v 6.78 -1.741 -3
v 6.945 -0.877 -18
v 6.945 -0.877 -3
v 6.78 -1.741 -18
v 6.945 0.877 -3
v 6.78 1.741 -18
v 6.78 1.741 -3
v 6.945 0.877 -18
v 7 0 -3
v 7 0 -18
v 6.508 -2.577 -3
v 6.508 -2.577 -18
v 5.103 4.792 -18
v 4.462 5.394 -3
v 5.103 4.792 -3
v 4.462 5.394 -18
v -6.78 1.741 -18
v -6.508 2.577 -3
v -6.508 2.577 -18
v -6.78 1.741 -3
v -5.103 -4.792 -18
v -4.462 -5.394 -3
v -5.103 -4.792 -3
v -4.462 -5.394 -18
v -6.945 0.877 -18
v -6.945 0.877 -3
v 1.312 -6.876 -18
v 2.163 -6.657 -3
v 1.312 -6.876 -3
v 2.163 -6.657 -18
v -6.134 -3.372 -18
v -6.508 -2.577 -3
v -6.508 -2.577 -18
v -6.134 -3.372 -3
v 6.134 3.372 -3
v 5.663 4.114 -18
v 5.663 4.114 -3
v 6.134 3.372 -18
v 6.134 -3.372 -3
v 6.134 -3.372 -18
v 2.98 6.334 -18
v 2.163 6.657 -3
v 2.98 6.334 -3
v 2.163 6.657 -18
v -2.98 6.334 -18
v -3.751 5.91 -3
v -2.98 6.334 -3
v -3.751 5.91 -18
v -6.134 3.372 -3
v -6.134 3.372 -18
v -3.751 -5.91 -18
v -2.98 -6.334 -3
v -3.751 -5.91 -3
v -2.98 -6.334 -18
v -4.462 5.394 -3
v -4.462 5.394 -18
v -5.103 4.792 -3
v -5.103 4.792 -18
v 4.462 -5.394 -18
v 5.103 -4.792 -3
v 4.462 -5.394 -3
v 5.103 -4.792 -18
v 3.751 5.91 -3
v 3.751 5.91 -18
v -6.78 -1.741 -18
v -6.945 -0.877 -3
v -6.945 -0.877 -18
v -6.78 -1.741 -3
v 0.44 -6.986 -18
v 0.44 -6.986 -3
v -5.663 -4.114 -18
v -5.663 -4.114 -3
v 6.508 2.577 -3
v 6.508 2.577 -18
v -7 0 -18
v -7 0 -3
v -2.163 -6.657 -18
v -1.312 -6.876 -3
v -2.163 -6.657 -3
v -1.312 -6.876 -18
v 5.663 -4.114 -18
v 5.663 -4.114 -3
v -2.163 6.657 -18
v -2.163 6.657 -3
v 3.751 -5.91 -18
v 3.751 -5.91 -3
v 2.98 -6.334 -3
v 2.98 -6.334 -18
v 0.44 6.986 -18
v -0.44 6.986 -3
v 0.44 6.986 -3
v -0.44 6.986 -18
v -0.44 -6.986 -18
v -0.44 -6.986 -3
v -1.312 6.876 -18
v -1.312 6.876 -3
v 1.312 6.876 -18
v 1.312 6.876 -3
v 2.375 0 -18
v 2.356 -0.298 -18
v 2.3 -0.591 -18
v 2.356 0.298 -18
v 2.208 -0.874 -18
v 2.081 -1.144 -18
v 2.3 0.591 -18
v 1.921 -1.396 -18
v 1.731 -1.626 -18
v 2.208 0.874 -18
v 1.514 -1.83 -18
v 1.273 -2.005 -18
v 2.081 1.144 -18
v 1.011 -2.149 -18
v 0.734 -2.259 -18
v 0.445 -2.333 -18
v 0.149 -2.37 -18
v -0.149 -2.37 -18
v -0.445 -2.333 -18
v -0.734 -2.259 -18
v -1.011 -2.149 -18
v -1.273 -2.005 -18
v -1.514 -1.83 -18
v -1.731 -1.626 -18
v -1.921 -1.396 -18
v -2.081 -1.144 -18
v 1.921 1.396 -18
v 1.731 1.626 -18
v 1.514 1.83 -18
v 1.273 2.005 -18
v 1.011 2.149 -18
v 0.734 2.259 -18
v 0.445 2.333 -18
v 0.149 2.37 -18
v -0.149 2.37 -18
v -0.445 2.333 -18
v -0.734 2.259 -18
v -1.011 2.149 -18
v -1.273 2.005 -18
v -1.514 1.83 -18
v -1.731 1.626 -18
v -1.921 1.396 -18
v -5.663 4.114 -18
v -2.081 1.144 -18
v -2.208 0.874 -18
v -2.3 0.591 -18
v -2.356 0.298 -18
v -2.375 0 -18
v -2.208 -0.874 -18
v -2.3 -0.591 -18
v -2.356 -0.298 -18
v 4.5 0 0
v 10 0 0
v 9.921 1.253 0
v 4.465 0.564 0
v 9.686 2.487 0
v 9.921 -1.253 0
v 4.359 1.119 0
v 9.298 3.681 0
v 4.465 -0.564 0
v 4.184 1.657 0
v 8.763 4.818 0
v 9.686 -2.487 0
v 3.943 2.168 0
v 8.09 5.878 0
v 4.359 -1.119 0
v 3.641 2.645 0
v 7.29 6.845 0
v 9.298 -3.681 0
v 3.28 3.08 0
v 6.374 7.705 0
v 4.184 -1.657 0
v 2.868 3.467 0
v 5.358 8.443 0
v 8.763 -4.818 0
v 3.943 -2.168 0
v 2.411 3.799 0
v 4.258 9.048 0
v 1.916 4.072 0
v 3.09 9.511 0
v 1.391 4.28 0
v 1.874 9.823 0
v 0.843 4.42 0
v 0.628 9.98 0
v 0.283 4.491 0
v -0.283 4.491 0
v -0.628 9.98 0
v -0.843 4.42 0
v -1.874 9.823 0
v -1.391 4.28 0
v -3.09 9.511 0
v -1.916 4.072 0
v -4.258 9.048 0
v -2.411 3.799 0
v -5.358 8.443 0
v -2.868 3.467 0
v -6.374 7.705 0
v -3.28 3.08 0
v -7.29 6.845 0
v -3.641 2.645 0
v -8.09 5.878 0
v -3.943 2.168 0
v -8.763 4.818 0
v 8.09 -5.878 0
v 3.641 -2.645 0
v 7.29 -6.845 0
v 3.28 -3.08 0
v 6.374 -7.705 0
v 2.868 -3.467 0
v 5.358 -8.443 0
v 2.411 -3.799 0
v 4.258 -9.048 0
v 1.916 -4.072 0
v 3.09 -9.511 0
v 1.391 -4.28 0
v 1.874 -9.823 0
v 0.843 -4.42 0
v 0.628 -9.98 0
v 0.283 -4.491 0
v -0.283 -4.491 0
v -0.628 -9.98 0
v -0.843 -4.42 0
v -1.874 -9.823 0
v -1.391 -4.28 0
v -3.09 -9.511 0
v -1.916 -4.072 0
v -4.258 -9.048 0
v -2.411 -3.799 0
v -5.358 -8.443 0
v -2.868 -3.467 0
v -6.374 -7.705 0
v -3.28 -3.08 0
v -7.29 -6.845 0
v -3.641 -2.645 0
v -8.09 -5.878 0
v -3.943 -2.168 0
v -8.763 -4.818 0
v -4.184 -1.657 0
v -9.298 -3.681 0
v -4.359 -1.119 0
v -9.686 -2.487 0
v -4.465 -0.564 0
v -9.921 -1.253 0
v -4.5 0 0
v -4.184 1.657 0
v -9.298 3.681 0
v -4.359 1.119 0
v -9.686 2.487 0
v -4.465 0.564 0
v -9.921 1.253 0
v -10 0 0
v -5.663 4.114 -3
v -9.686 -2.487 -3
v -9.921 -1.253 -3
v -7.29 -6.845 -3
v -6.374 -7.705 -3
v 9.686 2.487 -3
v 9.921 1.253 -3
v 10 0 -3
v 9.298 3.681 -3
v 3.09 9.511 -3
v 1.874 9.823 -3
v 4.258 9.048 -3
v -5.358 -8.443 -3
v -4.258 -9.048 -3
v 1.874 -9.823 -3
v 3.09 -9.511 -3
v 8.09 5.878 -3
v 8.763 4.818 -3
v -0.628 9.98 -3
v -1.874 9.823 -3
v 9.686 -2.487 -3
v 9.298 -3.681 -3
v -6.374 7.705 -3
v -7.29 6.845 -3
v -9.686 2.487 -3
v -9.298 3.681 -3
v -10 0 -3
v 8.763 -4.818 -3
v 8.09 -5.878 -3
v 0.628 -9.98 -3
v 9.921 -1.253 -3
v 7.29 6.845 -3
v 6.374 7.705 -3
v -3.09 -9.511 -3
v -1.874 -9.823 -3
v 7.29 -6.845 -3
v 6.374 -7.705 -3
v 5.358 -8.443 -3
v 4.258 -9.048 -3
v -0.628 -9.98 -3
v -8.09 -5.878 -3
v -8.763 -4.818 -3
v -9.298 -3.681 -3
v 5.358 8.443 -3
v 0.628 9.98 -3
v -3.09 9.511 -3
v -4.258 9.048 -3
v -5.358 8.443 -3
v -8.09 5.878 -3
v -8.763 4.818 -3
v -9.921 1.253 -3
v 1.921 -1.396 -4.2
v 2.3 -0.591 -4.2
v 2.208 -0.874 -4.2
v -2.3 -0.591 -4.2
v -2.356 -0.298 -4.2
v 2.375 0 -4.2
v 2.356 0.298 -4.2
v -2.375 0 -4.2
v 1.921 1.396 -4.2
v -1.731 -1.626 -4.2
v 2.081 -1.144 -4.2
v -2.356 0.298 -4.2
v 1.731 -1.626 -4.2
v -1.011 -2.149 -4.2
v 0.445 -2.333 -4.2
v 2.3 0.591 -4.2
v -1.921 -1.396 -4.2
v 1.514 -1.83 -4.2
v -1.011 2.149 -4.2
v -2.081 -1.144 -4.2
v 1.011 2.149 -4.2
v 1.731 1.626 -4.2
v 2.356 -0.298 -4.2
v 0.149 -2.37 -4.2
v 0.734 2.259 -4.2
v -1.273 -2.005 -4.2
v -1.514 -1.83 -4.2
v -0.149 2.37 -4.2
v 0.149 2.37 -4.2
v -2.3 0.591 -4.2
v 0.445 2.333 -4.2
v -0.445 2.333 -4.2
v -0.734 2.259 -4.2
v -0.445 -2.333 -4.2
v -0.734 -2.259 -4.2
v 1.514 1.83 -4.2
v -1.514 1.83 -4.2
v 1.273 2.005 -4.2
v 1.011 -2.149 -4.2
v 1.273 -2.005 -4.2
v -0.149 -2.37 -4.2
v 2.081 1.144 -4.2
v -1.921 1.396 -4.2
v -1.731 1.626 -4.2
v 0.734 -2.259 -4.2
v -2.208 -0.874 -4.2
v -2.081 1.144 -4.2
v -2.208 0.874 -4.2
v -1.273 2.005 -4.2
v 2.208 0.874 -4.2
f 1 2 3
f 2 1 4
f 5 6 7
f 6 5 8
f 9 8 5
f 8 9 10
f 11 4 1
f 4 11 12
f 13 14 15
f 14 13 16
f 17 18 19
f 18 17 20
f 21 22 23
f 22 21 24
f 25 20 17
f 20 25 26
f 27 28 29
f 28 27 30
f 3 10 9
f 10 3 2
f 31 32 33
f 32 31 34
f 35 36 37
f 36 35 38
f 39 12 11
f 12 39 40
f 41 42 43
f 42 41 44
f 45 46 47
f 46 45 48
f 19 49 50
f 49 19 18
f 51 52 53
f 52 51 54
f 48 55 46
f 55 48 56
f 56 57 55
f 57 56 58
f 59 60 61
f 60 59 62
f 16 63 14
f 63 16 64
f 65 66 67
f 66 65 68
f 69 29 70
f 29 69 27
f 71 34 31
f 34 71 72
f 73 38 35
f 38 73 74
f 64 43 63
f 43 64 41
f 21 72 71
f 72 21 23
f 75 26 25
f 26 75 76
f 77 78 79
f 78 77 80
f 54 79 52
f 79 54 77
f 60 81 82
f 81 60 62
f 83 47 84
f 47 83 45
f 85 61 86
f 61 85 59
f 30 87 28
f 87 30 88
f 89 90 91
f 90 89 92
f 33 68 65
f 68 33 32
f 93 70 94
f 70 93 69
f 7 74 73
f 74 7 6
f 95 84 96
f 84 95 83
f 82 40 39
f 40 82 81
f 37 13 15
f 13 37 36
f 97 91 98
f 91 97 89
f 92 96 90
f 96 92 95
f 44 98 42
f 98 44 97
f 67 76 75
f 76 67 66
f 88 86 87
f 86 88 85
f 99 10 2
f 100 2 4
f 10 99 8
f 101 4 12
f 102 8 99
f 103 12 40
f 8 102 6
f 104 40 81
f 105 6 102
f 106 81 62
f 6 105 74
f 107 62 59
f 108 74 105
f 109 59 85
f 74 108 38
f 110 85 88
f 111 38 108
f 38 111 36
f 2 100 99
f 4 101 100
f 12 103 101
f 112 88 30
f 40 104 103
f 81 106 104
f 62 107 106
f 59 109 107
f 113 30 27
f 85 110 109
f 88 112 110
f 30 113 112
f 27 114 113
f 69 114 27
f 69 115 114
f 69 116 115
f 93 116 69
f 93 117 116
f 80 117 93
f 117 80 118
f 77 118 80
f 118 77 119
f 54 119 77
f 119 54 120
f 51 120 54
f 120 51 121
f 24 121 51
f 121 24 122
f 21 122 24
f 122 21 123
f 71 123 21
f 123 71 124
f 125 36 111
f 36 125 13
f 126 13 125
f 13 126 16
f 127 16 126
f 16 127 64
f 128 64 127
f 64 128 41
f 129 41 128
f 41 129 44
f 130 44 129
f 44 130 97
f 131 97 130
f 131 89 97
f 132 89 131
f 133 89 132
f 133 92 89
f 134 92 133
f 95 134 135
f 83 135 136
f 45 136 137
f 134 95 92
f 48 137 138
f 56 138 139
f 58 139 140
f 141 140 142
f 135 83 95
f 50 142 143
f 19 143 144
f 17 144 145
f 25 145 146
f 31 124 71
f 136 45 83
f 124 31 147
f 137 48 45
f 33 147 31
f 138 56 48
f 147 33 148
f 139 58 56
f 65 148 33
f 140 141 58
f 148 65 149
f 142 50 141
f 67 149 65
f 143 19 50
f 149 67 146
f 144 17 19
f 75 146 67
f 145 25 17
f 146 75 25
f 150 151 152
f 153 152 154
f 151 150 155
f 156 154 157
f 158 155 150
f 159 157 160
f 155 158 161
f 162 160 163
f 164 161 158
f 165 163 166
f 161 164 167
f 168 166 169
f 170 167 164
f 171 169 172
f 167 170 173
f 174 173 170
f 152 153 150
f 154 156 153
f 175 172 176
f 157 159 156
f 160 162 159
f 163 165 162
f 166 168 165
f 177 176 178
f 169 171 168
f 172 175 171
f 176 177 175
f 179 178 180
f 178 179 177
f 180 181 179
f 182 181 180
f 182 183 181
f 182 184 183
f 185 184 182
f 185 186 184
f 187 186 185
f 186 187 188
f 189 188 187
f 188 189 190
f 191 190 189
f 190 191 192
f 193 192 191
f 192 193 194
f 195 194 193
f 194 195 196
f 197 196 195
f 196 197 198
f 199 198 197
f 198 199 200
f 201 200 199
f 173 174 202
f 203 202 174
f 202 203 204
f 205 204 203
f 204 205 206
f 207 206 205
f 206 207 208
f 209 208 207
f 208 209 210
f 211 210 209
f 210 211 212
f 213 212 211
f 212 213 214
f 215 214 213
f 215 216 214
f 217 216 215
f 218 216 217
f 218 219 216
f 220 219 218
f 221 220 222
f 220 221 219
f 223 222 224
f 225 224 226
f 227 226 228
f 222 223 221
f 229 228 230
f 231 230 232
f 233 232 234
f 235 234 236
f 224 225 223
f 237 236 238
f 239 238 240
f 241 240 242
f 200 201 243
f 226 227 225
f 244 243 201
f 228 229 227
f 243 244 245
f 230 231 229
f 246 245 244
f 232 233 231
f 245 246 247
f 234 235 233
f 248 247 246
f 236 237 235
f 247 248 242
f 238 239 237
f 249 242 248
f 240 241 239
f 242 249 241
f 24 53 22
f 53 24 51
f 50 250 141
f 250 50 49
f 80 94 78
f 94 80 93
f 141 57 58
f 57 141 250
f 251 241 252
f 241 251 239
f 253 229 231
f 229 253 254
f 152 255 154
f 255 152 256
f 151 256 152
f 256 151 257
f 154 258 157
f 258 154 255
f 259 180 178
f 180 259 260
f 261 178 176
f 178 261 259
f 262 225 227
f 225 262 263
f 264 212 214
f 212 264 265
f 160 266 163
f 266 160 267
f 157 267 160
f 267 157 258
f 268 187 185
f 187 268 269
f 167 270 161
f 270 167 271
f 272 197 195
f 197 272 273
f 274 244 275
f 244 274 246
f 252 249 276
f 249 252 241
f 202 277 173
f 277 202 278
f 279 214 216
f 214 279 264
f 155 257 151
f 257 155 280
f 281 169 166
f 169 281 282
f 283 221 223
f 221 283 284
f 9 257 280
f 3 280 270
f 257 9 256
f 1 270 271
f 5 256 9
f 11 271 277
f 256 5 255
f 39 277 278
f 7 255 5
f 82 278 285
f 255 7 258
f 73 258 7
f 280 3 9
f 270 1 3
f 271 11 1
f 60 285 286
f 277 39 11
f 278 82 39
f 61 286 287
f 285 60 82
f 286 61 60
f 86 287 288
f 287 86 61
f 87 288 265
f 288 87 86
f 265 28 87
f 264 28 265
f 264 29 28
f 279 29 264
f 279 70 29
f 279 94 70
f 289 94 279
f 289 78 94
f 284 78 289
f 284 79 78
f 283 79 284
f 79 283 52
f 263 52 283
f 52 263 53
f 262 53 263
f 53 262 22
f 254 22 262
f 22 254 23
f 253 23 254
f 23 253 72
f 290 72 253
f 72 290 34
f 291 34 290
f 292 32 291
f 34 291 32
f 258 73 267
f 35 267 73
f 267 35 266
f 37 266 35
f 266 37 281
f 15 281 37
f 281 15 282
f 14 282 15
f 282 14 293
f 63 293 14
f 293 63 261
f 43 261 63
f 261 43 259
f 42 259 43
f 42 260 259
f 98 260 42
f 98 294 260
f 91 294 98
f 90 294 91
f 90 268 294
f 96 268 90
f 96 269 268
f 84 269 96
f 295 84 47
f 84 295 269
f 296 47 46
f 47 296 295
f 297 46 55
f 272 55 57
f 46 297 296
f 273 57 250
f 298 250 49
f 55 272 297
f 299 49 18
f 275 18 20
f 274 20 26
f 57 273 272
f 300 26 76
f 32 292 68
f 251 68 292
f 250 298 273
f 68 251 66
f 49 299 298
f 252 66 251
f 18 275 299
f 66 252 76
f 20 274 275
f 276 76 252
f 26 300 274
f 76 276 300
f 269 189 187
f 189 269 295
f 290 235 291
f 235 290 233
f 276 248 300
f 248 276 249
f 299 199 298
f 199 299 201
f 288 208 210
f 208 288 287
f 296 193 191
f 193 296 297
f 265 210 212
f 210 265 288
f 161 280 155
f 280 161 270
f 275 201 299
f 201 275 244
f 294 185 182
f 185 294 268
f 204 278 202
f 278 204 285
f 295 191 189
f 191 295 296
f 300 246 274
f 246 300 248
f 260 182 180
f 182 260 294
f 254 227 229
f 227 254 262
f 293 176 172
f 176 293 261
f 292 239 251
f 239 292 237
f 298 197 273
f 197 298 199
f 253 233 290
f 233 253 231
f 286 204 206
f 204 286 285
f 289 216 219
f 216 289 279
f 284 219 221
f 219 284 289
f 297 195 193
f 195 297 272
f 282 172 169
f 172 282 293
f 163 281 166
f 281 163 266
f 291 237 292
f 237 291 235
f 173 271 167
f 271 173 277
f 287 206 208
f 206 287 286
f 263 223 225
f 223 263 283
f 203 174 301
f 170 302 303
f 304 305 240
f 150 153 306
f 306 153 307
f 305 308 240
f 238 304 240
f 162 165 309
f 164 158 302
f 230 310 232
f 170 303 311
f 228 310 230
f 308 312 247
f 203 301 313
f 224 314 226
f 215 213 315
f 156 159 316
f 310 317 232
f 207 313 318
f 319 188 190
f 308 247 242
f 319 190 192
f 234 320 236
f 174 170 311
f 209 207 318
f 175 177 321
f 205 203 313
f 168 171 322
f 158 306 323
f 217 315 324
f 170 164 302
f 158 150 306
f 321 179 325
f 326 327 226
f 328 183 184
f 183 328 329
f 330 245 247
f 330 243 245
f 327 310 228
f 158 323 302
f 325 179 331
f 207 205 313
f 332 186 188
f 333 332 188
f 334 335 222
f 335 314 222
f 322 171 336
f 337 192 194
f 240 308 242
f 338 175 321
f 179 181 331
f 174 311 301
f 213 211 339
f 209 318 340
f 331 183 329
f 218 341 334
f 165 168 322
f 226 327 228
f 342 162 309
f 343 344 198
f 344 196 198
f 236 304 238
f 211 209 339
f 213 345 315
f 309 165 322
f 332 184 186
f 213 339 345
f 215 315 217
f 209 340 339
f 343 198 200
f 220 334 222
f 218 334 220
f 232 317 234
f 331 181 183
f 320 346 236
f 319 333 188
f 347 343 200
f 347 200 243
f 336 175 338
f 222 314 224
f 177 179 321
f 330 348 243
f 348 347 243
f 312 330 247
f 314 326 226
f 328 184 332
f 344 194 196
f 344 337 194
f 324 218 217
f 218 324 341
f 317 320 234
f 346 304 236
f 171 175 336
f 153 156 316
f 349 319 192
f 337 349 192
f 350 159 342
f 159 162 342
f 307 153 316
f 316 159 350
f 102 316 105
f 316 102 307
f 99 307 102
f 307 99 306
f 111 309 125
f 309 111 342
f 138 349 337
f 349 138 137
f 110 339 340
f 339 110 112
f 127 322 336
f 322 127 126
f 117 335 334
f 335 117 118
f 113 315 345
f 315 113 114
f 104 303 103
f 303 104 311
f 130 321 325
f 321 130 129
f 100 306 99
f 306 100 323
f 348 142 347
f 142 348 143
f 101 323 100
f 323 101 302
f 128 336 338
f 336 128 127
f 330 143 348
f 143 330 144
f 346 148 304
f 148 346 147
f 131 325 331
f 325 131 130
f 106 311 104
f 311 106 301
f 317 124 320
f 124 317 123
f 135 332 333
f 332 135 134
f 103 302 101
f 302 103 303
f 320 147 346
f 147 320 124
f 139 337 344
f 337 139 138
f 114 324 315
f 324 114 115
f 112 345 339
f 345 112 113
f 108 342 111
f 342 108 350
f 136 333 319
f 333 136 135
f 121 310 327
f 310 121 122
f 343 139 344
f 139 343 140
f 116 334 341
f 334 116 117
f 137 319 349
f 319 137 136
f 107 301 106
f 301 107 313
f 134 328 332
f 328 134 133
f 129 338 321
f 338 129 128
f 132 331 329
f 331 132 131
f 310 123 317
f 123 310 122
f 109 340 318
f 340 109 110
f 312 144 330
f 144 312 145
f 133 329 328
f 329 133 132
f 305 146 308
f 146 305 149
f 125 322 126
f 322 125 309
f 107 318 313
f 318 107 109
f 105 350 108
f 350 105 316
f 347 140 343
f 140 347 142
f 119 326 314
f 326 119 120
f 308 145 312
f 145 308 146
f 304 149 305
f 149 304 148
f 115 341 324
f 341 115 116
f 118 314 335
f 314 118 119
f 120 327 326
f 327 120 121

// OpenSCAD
$fn = 50;


difference() {
	union() {
		translate(v = [0, 0, -18.0000000000]) {
			cylinder(h = 18, r = 7.0000000000);
		}
		translate(v = [0, 0, -3.0000000000]) {
			cylinder(h = 3, r = 10.0000000000);
		}
	}
	union() {
		translate(v = [0, 0, 0]) {
			rotate(a = [0, 0, 0]) {
				difference() {
					union() {
						#translate(v = [0, 0, -18.0000000000]) {
							cylinder(h = 18, r = 2.2500000000);
						}
						#translate(v = [0, 0, -4.2000000000]) {
							cylinder(h = 4.2000000000, r = 7.0000000000, r1 = 2.3750000000, r2 = 4.5000000000);
						}
						#translate(v = [0, 0, -18.0000000000]) {
							cylinder(h = 18, r = 2.3750000000);
						}
						#translate(v = [0, 0, -18.0000000000]) {
							cylinder(h = 18, r = 2.2500000000);
						}
					}
					union();
				}
			}
		}
	}
}
